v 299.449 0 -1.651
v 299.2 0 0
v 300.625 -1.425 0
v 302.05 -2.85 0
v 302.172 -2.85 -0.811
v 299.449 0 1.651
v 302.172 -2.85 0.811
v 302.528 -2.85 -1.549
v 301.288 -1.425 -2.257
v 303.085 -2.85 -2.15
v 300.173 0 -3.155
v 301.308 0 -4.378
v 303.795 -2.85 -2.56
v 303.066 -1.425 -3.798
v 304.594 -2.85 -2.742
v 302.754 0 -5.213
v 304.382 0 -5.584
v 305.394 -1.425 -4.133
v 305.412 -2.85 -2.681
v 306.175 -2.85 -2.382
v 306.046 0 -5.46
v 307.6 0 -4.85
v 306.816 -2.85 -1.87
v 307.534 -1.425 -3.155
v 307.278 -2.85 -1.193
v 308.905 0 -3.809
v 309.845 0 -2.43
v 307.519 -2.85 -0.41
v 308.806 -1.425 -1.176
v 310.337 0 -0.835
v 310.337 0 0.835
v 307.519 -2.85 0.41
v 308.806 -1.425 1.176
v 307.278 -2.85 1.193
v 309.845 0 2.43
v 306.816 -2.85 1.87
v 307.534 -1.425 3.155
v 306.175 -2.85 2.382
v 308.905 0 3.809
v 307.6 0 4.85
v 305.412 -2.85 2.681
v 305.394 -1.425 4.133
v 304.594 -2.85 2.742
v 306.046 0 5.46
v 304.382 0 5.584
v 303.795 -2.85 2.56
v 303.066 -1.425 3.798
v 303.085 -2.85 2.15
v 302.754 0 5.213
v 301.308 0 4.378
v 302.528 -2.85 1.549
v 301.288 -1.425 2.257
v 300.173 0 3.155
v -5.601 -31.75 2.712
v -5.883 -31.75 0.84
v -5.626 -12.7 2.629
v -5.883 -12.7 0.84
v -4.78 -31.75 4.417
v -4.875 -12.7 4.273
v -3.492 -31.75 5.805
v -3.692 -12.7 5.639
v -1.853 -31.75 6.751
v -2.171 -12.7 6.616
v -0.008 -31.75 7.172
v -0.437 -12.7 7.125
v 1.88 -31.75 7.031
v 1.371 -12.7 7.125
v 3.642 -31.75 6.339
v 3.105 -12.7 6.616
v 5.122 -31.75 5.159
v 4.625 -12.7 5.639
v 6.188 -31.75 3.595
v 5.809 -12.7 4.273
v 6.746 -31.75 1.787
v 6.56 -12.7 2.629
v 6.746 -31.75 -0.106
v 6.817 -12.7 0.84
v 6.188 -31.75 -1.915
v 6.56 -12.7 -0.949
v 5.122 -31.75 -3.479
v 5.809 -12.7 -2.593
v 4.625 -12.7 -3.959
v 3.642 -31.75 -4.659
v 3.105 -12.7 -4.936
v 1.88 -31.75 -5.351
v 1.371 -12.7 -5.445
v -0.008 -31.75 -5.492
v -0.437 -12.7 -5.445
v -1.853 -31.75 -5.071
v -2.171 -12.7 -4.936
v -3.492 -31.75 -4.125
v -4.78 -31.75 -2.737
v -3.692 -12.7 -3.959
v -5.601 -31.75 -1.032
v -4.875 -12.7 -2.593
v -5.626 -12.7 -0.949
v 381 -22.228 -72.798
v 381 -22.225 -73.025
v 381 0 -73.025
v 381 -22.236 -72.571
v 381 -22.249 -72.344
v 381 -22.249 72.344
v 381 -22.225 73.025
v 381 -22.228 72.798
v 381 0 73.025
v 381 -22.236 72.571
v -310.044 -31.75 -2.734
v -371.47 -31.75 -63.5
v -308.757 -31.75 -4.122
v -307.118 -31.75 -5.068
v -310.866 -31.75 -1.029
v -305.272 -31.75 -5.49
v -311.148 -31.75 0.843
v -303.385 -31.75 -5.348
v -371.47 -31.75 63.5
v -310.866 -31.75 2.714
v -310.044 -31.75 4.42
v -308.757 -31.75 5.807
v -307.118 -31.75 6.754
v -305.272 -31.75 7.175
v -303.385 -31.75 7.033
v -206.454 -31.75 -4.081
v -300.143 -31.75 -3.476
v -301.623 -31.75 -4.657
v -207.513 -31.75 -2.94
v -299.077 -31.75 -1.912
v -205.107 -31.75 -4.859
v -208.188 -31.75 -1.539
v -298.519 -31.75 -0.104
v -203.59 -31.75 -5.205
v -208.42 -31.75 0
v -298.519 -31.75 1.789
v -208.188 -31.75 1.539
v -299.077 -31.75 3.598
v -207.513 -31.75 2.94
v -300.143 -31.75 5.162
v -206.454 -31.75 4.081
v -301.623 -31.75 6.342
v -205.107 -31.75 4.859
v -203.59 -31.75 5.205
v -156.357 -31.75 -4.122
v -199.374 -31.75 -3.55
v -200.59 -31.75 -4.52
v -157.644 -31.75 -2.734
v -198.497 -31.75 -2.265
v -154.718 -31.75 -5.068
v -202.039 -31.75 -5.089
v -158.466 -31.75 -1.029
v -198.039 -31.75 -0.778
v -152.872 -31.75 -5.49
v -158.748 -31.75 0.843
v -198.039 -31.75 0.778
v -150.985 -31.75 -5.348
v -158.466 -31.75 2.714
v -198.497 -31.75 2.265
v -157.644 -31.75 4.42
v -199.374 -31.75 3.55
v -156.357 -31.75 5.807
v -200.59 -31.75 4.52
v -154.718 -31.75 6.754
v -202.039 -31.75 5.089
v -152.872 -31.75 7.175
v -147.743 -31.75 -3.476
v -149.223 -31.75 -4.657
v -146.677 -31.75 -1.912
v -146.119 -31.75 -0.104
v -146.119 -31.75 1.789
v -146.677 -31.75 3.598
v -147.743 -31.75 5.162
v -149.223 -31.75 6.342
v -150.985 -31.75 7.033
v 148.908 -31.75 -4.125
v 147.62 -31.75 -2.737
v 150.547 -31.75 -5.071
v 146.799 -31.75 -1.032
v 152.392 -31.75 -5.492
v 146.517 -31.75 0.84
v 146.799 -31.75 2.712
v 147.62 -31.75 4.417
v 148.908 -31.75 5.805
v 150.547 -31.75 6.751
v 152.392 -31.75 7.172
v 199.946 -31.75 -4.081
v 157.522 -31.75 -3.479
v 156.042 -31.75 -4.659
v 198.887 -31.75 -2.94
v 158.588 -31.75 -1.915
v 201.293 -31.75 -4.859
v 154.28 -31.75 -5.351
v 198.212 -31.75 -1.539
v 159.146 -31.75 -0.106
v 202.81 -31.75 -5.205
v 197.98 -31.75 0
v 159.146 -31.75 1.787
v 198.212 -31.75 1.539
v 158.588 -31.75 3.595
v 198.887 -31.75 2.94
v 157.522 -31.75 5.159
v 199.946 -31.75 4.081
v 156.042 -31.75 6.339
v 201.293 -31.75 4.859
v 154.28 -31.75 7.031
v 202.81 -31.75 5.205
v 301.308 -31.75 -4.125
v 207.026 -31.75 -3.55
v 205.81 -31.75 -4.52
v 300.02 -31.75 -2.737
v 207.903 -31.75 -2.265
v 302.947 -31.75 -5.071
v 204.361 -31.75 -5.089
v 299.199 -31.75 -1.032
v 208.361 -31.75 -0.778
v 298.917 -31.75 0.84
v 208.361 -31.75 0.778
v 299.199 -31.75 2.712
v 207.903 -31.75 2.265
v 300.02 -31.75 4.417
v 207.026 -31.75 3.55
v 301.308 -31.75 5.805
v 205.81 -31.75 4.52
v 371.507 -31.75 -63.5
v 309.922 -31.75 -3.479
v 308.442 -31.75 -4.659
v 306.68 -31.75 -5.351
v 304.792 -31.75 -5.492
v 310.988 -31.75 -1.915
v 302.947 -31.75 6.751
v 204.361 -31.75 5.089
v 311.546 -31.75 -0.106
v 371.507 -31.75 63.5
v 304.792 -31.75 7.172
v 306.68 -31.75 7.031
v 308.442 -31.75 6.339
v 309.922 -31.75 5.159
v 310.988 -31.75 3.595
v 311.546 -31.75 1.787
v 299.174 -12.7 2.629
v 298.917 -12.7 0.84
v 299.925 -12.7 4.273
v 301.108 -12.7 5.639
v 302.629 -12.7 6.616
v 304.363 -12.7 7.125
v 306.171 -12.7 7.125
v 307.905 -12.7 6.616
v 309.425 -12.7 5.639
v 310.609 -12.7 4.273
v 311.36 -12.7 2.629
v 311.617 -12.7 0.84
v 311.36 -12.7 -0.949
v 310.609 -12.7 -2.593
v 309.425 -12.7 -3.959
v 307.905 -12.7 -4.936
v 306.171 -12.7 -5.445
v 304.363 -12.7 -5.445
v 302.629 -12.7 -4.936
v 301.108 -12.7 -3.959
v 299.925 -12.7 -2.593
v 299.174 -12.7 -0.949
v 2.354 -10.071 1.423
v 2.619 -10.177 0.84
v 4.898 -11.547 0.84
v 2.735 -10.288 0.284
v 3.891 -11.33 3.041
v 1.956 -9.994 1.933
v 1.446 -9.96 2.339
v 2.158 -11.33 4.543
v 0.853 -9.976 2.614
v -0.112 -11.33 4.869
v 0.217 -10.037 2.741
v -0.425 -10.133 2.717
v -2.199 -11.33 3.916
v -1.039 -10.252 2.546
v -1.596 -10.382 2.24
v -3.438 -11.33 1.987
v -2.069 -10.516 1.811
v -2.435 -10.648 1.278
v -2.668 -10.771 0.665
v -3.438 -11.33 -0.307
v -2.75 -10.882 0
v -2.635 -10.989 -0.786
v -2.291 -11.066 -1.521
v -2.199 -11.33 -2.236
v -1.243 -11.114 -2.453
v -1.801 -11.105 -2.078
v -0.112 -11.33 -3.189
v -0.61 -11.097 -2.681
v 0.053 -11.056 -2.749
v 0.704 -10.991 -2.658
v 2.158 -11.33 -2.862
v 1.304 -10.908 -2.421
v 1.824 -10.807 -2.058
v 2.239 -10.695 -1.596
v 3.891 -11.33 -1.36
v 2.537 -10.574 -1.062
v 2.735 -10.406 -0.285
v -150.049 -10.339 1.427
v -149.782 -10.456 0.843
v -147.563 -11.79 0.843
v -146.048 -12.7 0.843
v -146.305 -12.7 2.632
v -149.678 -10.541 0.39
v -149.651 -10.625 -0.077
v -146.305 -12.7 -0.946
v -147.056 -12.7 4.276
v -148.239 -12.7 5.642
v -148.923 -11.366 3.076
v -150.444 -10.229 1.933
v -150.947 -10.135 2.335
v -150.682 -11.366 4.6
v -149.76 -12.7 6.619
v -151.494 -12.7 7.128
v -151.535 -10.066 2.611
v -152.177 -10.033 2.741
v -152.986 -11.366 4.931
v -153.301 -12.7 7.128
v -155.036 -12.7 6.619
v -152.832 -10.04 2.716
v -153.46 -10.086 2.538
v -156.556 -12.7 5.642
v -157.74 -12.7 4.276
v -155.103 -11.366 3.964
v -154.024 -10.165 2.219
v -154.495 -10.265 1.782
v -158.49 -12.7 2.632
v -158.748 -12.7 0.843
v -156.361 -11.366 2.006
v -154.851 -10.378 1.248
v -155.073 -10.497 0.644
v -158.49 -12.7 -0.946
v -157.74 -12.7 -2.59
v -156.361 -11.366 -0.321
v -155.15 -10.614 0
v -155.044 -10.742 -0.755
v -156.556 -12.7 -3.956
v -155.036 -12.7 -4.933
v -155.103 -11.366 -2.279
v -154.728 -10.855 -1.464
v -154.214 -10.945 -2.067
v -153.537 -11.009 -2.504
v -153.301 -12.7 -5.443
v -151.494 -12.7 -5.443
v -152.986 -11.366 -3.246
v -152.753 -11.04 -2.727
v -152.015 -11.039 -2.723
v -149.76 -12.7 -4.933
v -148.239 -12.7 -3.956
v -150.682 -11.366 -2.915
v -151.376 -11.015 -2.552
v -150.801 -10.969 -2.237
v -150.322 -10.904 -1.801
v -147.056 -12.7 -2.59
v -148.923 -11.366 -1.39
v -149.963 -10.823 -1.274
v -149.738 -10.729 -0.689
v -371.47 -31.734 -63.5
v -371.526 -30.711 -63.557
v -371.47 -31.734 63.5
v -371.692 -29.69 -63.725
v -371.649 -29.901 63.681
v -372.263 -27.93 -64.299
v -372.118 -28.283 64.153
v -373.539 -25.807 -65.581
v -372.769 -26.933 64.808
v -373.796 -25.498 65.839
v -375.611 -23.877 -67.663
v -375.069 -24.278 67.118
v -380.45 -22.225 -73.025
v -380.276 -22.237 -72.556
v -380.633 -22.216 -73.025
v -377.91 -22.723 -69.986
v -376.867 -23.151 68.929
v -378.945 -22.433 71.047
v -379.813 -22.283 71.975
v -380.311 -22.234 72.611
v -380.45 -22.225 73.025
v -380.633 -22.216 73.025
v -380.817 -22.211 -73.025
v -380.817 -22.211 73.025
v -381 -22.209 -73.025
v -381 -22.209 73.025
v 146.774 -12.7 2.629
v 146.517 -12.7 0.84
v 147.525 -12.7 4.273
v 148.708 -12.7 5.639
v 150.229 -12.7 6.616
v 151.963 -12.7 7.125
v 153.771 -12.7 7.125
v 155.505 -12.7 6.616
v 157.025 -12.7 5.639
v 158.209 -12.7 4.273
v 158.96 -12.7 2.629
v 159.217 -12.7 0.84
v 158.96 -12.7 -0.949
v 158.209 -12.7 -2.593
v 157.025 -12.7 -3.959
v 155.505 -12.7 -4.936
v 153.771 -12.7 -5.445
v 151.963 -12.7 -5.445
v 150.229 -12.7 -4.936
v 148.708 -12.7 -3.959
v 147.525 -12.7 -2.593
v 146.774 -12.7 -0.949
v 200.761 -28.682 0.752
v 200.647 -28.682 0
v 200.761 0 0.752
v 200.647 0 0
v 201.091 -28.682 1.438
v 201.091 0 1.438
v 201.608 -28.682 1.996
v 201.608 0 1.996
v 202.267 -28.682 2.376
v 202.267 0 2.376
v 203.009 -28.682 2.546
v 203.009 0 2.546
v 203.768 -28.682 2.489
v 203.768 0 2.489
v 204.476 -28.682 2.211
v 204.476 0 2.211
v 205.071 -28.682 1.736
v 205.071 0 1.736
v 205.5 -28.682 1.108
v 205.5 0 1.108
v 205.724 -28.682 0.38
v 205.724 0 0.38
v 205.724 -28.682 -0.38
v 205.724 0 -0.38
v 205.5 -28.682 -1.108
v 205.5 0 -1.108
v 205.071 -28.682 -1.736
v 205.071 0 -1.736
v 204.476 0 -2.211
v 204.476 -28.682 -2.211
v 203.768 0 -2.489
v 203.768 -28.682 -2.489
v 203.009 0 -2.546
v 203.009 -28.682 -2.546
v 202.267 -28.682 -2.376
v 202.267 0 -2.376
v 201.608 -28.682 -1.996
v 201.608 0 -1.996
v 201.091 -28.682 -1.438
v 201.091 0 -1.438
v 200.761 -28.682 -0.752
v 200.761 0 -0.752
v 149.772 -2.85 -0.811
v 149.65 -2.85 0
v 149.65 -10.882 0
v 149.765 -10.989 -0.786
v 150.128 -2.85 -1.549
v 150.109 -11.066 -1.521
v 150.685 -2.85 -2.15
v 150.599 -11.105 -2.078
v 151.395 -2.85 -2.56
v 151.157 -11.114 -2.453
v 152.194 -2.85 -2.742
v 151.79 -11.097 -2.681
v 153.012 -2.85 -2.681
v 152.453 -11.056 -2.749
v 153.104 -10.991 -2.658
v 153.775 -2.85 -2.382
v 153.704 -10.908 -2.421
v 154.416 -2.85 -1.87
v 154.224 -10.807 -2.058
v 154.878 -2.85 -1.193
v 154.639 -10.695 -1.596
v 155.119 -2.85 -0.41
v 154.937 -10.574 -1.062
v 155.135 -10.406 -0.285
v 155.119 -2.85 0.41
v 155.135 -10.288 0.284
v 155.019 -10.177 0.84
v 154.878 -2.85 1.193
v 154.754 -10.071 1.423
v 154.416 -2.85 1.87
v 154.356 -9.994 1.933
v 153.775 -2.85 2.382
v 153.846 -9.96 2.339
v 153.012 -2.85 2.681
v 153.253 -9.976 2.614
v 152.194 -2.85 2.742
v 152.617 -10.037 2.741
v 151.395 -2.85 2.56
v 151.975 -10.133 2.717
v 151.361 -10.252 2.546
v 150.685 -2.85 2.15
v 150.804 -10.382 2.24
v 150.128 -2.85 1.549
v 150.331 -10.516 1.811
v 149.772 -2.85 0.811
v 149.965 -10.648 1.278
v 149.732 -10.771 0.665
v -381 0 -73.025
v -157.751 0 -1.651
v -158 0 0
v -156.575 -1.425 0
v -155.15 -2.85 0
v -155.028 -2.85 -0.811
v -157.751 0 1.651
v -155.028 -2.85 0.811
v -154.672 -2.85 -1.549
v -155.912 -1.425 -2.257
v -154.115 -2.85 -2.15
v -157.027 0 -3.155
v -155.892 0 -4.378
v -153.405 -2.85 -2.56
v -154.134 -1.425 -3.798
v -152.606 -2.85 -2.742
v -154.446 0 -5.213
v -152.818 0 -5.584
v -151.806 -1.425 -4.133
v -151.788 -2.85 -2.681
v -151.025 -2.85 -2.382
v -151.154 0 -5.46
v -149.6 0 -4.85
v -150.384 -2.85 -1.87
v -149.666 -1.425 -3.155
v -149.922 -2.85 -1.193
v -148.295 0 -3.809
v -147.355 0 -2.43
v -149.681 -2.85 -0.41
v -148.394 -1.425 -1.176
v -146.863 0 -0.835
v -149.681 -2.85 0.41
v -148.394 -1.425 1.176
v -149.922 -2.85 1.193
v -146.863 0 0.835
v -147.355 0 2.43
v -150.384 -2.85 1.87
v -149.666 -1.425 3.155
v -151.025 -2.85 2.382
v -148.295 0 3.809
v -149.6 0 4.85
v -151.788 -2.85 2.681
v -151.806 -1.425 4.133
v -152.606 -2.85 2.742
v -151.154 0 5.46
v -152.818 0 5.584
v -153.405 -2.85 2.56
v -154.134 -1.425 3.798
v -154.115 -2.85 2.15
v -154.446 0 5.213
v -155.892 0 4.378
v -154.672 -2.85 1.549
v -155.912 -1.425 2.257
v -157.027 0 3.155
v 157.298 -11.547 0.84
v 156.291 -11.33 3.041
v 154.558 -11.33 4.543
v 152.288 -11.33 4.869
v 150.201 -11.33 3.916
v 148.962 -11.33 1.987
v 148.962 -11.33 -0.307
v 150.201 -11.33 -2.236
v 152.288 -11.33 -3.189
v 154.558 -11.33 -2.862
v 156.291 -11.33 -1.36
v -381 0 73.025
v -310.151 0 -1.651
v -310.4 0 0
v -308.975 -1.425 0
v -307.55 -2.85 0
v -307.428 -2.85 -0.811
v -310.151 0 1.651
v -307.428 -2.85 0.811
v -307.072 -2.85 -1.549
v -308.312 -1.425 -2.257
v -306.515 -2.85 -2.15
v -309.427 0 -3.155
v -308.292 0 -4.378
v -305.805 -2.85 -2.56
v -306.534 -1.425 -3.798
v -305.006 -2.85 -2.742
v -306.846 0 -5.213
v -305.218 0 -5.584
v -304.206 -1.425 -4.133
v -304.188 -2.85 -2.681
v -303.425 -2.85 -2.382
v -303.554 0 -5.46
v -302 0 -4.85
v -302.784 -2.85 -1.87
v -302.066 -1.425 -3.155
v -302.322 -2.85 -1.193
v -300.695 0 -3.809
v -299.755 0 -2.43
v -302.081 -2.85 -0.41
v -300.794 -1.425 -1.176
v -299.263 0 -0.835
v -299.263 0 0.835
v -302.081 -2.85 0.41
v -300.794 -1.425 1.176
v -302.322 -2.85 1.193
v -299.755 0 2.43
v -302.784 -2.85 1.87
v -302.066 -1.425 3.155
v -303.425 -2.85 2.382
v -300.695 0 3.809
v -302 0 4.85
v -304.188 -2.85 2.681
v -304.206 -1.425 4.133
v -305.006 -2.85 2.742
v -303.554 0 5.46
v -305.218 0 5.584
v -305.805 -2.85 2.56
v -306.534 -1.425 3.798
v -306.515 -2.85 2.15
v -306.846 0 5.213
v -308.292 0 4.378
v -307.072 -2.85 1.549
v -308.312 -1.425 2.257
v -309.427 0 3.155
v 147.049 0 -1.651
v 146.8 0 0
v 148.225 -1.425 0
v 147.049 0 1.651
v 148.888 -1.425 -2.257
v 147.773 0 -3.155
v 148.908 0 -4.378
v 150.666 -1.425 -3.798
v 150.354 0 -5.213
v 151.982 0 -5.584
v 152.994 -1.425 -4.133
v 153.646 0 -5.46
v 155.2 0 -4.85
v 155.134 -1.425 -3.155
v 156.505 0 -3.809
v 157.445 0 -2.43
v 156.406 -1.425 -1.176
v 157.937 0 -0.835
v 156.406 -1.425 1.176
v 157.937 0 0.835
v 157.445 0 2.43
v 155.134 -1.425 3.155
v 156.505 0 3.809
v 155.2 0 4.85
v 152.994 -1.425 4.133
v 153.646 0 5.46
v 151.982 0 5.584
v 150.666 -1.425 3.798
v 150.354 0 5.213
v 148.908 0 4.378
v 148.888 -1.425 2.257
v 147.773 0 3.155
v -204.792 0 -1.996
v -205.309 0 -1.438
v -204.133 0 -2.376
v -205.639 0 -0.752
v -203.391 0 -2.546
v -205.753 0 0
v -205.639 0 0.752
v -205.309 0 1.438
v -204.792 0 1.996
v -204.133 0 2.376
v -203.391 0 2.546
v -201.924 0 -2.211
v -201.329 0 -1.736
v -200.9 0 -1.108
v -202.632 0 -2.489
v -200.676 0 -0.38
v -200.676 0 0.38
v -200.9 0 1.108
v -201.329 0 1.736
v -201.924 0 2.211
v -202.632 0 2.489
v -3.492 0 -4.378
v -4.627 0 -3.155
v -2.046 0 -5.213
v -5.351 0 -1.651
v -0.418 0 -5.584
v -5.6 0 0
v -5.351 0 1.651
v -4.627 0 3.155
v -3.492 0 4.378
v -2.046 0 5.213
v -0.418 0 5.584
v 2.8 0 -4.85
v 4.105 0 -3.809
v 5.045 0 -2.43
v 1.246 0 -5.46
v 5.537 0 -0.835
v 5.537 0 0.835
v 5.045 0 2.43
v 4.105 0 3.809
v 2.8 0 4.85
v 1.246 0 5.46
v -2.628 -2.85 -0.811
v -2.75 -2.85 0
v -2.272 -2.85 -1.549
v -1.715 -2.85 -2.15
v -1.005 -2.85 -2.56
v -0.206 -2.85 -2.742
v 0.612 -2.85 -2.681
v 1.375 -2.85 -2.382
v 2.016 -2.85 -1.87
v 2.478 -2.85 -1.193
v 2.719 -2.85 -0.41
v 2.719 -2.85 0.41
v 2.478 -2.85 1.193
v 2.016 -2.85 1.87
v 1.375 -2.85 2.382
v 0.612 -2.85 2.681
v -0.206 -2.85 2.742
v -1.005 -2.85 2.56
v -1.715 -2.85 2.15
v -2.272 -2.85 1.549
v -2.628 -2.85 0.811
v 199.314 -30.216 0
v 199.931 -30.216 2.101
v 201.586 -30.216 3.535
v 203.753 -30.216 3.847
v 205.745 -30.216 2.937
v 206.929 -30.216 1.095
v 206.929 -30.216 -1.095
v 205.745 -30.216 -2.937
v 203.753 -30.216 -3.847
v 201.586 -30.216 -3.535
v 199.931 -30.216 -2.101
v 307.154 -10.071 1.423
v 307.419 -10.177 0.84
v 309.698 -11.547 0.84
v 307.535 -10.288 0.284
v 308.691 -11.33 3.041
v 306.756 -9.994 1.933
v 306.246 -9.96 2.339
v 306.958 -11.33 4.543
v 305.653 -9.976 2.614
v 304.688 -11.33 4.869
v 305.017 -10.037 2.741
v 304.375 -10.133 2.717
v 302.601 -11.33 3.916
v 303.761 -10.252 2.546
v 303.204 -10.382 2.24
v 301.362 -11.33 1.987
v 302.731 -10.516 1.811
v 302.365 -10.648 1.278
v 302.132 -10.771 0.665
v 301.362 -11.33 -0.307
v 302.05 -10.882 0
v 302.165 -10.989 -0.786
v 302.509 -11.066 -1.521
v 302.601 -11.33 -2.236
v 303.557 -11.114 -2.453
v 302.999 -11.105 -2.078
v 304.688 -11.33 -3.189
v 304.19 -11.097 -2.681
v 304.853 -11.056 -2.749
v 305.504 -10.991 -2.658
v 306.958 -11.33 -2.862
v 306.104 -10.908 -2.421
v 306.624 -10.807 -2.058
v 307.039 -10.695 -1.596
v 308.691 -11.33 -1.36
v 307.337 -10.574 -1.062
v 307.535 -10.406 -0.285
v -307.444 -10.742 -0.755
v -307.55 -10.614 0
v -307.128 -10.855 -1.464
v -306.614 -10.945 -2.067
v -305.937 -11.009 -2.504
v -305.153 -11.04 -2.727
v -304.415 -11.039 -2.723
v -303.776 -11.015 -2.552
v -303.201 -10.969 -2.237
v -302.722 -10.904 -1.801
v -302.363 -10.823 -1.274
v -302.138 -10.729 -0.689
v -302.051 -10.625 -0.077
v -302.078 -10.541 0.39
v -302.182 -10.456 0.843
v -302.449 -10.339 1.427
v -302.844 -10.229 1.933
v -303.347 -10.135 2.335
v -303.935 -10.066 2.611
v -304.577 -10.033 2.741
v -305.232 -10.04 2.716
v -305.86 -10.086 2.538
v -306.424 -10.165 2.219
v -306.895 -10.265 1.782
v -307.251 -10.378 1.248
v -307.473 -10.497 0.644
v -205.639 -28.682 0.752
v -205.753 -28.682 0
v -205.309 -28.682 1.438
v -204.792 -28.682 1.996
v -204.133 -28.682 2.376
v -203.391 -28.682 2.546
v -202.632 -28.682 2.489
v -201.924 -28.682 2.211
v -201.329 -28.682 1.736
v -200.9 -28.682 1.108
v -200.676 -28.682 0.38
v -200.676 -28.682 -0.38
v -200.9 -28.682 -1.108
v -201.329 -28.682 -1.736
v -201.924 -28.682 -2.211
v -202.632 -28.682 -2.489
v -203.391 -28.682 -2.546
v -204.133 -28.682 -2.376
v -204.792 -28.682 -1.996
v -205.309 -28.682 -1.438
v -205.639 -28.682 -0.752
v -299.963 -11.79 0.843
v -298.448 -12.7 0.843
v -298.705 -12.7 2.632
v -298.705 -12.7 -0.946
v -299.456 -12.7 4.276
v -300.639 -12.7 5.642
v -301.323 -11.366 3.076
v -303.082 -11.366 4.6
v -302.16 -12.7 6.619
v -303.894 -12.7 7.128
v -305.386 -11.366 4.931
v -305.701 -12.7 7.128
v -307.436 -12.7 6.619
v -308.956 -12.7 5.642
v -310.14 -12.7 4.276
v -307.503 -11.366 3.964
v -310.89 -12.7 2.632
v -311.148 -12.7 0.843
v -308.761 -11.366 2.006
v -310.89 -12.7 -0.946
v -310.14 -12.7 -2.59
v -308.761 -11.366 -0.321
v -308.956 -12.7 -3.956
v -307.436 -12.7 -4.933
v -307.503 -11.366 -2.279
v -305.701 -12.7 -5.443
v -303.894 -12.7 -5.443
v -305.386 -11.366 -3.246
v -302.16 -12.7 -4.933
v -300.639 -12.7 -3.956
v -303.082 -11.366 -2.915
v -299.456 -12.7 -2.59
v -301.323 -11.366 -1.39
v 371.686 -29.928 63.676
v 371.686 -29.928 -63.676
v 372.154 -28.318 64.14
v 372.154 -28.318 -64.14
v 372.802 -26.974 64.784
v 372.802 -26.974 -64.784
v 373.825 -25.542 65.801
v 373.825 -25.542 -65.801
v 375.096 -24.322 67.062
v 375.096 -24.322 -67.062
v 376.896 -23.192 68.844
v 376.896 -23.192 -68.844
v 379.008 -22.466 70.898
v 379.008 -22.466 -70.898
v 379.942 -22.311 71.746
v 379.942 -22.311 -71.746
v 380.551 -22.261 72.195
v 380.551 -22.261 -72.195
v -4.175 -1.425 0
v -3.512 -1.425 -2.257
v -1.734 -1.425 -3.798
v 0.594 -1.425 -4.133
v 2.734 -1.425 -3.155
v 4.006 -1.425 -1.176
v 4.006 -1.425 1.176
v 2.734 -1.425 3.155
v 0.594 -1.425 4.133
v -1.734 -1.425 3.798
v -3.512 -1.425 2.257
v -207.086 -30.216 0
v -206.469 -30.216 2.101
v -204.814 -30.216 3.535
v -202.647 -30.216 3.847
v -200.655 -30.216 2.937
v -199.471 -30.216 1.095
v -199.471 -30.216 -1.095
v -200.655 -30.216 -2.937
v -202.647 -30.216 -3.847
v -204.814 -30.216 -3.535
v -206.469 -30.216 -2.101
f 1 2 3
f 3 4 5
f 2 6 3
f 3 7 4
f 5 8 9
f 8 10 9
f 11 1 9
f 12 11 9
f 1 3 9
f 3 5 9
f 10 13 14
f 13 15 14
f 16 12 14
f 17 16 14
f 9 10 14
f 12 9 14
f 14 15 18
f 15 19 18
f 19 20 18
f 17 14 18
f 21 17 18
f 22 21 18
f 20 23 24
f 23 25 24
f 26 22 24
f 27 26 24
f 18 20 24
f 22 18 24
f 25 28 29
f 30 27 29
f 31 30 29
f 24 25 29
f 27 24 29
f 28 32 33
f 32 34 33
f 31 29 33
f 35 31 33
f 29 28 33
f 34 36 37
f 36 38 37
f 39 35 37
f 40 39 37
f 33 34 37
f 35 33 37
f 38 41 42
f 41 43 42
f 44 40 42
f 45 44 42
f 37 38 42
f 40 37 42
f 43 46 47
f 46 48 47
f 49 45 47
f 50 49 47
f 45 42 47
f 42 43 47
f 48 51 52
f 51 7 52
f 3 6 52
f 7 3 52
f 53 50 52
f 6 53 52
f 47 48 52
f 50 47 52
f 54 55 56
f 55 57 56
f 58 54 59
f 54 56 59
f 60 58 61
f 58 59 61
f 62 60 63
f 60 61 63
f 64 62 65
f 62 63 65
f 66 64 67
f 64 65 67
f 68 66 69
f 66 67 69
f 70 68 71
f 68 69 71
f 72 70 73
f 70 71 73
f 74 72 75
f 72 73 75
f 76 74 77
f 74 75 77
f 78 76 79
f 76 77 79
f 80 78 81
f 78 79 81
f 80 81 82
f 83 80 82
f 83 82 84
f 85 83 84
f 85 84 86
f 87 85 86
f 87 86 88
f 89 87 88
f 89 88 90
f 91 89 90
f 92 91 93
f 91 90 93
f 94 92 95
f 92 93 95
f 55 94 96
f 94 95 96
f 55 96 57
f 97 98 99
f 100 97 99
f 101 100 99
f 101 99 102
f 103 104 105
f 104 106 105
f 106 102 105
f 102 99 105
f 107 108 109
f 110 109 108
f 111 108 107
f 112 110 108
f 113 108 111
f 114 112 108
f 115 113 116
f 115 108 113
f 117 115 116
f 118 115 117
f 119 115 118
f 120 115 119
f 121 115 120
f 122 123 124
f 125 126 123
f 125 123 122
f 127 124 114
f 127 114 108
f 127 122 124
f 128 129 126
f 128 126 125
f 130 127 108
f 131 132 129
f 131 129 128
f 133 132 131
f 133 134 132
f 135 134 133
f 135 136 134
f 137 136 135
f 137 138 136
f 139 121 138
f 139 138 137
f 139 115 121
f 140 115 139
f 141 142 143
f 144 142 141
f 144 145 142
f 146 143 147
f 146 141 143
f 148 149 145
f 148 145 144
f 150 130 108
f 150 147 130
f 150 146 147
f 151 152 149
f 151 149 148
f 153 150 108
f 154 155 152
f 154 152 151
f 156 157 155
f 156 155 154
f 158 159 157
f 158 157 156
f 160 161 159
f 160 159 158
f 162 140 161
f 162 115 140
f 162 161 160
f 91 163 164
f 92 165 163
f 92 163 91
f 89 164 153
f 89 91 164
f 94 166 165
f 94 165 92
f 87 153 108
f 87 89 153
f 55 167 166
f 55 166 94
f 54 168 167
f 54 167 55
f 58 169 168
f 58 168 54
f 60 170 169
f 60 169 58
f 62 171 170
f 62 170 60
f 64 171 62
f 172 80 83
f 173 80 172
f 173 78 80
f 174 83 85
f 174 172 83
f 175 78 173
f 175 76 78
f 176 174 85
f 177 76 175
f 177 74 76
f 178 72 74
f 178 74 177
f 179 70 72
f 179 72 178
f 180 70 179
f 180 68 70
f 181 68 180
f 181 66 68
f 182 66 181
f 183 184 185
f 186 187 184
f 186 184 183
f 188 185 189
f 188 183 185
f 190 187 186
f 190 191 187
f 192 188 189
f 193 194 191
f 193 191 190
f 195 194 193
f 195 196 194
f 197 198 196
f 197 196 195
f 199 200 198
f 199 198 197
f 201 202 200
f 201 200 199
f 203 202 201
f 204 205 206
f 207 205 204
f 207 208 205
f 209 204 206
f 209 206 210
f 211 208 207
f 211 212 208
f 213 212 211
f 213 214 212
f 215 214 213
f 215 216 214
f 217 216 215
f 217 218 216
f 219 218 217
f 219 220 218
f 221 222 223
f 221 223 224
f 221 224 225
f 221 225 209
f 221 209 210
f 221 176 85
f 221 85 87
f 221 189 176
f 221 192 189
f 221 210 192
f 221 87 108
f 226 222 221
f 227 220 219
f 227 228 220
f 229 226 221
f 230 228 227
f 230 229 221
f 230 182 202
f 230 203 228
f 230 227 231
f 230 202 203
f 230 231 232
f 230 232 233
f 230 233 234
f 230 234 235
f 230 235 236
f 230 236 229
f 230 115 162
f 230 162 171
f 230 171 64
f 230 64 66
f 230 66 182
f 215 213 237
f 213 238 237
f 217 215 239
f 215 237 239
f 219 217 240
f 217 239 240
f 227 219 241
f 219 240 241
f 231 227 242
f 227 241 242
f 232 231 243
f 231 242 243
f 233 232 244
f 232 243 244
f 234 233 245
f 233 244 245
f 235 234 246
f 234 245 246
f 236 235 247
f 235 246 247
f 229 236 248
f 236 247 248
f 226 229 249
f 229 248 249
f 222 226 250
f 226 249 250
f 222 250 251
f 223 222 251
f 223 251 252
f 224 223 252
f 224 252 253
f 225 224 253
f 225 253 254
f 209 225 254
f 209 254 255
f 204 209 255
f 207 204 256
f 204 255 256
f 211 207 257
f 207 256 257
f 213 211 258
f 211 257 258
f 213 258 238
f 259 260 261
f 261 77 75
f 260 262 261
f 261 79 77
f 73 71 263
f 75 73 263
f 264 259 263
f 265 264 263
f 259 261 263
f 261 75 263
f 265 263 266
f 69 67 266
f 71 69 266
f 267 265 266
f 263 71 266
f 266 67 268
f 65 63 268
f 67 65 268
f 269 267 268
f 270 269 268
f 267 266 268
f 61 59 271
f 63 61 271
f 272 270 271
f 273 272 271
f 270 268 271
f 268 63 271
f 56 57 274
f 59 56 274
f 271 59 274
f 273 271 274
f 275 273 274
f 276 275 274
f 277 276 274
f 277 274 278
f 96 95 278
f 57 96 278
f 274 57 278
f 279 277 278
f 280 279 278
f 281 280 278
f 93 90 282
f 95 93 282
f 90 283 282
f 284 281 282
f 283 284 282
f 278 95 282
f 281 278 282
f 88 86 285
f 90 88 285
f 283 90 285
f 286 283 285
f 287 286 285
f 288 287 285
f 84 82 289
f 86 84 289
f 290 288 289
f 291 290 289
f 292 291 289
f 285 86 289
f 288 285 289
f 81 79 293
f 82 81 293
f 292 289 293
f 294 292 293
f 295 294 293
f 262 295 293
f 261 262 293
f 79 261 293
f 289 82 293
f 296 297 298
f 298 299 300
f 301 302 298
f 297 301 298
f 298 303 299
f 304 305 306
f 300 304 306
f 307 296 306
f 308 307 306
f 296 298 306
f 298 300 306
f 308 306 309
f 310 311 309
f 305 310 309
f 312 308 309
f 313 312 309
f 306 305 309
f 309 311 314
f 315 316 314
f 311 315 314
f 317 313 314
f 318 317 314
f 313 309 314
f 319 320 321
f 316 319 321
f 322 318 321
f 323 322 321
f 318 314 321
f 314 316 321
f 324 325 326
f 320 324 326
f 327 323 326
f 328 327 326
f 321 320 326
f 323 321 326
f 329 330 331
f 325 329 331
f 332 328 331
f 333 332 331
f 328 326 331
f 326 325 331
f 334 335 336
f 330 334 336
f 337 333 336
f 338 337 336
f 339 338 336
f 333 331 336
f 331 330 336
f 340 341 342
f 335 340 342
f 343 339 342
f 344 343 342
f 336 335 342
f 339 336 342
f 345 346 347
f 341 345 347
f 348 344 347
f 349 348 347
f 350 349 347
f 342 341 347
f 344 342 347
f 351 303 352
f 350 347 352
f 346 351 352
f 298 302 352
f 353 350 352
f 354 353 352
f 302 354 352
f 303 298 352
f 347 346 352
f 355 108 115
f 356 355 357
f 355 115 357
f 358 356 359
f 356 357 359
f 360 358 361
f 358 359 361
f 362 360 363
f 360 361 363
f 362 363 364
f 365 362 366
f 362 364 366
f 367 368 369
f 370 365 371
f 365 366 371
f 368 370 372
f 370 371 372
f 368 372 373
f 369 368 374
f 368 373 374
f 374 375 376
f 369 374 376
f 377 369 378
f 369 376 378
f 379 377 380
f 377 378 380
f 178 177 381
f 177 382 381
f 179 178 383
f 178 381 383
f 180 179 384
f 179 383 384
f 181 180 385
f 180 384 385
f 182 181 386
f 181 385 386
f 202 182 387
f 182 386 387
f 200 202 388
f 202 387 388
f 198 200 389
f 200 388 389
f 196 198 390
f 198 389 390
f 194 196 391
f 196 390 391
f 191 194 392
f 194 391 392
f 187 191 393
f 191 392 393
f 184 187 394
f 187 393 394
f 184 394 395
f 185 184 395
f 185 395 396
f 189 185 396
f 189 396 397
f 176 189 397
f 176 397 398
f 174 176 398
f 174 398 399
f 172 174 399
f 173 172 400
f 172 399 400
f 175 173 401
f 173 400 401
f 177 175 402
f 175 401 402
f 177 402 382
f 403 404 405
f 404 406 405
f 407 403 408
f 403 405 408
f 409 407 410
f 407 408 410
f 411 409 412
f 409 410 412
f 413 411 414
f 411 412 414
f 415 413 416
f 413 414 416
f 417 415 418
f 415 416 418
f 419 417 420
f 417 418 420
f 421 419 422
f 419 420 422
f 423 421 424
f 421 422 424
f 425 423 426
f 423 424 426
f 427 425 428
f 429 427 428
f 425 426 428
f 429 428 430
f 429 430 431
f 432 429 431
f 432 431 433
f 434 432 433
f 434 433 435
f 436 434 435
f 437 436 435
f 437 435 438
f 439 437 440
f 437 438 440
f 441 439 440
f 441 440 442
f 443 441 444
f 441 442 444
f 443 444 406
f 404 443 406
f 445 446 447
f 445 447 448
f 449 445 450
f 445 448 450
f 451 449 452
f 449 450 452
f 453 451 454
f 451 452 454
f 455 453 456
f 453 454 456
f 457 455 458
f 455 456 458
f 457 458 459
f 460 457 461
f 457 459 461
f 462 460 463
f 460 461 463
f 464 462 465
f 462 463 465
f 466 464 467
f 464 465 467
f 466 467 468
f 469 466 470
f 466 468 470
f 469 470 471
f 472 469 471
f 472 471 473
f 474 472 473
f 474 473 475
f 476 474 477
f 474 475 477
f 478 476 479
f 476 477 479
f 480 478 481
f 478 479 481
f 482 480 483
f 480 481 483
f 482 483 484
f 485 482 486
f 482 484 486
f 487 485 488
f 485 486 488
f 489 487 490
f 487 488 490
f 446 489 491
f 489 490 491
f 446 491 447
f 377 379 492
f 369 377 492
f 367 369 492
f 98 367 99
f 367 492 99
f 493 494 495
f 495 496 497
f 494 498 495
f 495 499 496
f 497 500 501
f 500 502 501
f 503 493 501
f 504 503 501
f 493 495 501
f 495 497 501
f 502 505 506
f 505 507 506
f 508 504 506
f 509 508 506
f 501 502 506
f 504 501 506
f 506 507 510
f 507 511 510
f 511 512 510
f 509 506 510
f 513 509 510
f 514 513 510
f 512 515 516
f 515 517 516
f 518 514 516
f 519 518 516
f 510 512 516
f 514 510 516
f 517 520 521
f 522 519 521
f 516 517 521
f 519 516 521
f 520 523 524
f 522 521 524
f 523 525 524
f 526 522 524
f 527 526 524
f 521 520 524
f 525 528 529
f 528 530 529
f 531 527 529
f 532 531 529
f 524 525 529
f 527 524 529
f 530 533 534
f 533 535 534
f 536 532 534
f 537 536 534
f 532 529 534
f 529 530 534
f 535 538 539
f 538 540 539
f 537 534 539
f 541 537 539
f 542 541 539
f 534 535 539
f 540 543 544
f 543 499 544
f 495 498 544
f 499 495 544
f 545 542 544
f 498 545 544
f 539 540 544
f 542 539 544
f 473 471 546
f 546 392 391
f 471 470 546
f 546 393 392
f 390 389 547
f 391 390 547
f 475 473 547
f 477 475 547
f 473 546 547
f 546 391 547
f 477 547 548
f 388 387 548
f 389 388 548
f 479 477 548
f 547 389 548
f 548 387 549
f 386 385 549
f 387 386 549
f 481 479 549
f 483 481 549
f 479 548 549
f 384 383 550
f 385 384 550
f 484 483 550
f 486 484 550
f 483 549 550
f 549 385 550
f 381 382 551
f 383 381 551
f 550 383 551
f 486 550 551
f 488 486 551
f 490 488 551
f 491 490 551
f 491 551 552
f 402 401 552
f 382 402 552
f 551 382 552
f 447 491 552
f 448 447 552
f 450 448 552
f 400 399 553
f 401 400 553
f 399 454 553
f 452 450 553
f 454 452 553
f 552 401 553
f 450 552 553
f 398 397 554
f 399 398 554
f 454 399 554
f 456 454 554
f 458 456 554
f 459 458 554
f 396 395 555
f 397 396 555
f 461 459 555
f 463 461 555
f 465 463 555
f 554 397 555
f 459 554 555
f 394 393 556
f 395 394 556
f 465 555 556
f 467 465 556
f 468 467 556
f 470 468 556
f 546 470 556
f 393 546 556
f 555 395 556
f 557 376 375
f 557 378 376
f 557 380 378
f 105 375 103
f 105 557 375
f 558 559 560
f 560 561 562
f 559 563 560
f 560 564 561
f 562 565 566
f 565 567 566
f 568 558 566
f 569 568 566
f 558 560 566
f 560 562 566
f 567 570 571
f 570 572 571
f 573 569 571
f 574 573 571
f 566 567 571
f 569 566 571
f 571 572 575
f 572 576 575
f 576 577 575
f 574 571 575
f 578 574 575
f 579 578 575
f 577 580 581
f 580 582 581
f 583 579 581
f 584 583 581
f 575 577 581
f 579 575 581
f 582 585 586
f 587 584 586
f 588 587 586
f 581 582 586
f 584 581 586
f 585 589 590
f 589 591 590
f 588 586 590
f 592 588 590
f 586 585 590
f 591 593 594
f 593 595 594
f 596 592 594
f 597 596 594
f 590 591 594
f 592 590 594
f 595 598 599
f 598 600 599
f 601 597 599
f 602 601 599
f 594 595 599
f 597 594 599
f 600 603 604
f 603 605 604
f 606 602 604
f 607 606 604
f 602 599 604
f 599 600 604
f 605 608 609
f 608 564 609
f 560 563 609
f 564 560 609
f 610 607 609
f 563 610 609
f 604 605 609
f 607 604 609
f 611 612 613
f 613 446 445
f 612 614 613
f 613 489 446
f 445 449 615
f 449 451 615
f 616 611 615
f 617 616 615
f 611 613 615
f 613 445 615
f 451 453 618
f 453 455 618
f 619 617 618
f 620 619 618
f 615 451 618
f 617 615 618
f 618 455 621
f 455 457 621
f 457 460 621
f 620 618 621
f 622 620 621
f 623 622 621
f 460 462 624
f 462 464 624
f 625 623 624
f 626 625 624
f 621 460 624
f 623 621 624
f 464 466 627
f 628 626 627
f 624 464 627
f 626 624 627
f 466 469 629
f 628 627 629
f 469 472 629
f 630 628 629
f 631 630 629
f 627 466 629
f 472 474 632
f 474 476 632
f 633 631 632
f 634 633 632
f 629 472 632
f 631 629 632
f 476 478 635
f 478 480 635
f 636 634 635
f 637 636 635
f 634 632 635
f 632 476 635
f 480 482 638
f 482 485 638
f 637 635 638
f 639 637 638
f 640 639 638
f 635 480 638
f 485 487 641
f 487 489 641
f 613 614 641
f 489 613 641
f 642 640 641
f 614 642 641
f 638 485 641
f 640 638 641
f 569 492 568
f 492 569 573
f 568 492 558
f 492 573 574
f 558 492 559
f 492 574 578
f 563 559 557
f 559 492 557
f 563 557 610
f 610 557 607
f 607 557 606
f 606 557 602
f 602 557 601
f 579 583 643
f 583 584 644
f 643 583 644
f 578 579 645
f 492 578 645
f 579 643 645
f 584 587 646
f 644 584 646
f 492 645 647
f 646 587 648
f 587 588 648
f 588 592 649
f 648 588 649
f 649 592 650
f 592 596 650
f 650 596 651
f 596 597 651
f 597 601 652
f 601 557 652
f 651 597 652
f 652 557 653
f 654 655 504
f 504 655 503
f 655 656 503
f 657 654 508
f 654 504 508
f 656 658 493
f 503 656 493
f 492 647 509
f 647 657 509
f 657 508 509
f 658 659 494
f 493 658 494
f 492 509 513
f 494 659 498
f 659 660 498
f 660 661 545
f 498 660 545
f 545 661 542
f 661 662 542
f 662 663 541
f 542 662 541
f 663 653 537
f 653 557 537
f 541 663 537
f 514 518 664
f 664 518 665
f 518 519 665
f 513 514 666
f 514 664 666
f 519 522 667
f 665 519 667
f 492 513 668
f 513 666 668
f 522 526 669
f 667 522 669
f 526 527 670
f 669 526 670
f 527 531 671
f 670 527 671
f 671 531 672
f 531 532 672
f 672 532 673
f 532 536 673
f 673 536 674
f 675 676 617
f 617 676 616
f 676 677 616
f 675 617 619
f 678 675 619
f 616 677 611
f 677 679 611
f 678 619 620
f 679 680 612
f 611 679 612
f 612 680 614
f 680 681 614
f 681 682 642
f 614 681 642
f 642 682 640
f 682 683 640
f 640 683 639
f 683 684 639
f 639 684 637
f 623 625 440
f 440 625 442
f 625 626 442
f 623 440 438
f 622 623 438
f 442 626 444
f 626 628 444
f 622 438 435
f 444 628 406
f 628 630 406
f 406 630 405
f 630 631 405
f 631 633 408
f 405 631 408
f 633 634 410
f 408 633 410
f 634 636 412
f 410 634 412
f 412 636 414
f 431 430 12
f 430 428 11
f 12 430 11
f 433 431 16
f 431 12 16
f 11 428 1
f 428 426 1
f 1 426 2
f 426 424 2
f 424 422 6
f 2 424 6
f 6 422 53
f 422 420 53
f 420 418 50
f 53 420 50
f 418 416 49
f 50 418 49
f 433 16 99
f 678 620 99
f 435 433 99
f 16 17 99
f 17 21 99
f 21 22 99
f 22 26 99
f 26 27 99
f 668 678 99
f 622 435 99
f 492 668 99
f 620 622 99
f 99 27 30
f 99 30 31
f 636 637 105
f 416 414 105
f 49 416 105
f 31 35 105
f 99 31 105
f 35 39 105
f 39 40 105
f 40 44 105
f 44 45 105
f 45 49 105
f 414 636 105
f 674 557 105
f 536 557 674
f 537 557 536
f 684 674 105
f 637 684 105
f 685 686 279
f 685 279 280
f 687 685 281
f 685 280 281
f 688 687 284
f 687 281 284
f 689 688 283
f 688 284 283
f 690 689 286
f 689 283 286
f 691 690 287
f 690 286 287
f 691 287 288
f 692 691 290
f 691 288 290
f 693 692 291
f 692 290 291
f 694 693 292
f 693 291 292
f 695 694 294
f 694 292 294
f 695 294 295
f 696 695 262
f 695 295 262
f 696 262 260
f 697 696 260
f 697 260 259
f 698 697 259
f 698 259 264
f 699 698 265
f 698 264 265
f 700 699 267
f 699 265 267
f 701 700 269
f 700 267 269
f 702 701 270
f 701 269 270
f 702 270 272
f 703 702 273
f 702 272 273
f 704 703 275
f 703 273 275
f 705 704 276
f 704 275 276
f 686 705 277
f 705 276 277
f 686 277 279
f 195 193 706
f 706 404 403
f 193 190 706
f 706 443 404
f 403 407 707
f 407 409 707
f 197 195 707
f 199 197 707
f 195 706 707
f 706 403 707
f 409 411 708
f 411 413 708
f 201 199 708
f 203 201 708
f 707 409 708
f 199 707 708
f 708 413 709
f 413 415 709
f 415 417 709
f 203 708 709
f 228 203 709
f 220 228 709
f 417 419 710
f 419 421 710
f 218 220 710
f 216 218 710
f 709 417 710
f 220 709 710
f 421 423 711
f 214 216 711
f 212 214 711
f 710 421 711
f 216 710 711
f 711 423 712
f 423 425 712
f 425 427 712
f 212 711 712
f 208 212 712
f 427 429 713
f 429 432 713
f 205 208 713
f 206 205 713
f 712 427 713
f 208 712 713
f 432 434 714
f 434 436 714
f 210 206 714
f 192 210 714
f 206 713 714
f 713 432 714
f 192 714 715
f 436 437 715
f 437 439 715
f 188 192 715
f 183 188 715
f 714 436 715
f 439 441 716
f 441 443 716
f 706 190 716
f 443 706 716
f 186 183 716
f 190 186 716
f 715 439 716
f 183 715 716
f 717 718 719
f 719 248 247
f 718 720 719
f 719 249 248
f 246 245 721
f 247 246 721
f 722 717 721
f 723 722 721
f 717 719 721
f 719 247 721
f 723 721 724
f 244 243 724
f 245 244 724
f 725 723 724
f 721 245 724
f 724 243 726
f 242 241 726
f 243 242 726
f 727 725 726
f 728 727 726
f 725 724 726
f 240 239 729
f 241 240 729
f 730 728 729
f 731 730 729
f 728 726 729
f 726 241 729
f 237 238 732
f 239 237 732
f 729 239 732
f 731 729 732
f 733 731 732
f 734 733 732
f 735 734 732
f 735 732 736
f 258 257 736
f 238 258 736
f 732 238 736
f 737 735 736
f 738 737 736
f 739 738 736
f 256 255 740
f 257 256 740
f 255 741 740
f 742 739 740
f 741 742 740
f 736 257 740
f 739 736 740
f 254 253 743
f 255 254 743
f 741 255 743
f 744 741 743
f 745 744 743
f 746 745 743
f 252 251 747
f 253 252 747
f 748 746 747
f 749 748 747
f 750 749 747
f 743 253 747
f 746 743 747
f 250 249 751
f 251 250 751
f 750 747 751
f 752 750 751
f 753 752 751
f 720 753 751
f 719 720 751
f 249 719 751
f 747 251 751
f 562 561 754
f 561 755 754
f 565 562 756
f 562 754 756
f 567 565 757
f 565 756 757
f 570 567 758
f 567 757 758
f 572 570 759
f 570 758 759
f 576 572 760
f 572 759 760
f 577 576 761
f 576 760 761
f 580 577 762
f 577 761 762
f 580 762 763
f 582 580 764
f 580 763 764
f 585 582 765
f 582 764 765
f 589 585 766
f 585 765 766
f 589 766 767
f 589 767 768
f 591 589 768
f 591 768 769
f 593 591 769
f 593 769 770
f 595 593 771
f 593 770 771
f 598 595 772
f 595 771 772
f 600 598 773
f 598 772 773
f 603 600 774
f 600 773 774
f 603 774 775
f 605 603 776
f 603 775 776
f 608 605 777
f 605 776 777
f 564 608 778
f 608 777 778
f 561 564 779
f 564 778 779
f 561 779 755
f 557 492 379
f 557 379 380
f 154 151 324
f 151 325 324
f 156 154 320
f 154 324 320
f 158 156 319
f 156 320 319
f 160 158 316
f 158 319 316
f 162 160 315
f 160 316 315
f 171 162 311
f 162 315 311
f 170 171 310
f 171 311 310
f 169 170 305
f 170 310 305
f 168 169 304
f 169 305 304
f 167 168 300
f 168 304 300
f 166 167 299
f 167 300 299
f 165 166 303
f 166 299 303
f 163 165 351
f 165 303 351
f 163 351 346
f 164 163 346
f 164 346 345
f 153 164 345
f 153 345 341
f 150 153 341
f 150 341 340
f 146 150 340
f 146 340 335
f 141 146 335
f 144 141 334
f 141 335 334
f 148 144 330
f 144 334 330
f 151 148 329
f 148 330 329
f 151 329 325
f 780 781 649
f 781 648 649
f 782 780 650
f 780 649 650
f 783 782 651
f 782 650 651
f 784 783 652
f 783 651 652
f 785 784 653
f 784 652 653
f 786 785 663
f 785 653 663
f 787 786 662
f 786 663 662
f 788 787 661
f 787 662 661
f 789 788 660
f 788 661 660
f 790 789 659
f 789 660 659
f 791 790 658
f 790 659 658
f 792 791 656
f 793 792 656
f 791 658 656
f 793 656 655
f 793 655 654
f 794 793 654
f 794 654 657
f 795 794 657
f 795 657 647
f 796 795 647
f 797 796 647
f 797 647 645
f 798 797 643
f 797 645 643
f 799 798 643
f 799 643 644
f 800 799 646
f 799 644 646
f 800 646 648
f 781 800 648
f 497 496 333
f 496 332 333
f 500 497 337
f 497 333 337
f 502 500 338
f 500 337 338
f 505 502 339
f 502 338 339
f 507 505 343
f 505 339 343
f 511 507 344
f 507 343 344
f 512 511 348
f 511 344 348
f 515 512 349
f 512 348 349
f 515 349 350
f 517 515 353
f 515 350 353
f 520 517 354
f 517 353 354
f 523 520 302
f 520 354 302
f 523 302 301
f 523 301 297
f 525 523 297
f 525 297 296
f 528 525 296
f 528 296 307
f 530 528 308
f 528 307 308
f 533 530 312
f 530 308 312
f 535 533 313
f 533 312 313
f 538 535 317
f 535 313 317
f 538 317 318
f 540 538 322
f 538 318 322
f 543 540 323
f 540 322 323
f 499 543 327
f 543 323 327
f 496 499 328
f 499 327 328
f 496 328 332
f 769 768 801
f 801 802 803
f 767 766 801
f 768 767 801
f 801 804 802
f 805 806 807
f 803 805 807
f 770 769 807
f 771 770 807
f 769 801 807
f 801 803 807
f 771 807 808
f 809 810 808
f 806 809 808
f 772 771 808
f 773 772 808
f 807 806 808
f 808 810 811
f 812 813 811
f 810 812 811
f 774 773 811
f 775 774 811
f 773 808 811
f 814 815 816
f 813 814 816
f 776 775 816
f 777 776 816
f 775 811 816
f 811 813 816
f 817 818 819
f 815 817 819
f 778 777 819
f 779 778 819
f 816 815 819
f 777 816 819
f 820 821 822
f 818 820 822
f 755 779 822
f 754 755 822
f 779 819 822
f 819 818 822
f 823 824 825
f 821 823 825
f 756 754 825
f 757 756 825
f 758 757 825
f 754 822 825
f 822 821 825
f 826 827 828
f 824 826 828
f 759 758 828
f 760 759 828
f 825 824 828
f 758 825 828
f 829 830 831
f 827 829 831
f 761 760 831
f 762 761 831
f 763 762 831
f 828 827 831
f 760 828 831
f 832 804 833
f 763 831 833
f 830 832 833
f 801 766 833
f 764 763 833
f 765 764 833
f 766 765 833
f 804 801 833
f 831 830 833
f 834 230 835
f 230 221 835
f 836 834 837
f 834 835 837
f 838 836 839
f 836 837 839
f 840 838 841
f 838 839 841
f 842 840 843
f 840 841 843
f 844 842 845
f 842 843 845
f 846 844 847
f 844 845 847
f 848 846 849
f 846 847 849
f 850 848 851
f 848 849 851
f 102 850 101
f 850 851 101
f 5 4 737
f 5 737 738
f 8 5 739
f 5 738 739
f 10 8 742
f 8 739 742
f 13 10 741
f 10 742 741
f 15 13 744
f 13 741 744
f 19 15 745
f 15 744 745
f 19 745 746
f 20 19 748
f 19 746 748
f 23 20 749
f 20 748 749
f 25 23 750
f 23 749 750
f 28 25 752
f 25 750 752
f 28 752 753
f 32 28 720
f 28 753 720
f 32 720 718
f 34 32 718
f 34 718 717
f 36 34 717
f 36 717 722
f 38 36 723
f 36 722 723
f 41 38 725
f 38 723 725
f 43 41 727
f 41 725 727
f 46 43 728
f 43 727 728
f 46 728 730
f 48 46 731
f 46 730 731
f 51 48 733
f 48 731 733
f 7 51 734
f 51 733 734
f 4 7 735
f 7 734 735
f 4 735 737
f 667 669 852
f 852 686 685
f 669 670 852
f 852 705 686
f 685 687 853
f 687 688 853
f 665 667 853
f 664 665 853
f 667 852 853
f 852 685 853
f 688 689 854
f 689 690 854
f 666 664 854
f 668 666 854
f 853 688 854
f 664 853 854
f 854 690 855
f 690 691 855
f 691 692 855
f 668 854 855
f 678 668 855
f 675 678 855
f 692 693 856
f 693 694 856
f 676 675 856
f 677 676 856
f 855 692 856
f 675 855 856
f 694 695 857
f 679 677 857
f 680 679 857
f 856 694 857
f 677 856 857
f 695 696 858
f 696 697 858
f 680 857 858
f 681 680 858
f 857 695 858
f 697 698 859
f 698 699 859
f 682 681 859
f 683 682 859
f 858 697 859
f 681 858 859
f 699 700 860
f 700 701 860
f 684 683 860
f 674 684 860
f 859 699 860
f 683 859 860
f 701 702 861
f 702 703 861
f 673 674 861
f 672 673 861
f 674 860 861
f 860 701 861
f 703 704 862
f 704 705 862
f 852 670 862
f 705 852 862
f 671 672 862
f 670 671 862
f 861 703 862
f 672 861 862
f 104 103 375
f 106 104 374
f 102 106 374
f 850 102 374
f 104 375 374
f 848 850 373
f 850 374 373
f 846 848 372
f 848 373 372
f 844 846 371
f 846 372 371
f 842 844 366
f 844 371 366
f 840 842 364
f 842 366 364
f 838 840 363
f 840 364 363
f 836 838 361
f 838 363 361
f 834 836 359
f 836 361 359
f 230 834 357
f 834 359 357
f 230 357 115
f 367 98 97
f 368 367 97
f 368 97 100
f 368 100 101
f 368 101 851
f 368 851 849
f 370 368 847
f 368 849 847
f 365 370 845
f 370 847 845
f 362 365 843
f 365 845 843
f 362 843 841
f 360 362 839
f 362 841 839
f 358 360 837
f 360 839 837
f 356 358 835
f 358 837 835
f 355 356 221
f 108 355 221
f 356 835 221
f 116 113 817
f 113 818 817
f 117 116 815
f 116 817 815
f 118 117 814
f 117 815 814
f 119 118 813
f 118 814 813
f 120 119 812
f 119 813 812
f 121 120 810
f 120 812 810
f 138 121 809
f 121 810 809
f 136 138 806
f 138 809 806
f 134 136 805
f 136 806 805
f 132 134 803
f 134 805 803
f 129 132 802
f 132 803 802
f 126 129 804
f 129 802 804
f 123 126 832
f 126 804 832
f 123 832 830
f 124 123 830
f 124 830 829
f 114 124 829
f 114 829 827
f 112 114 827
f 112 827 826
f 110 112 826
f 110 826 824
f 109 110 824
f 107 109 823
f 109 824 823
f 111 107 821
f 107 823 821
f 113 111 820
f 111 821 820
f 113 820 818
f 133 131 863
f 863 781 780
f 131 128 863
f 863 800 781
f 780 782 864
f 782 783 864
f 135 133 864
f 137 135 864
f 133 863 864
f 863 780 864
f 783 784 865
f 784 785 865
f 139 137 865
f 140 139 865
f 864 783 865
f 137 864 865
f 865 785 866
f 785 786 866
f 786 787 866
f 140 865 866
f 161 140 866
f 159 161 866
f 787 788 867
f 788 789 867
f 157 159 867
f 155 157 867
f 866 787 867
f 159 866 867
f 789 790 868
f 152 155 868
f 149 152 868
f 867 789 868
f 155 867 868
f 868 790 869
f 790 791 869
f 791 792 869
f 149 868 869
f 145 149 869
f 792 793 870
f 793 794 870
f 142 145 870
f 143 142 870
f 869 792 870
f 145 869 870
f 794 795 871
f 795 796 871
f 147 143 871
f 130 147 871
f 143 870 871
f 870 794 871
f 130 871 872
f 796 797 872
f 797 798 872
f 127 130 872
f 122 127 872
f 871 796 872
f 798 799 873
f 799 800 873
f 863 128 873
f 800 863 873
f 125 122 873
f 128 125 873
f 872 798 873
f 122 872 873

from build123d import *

# Parameters (mm, degrees)
F0_W            = 762
F0_H            = 146.05
F1_DEPTH        = 31.75
F2_R            = 9.525
F3_DEPTH        = 762.001
F4_R            = 9.525
F5_DEPTH        = 146.051
F6_R            = 9.525
F7_DEPTH        = 762.0010001
F8_R            = 9.5195259248
F9_DEPTH        = 146.0510001
F11_D           = 12.7
F11_DEPTH       = 19.05
F11_TIP         = 3.8154649308
F12_D           = 5.5
F12_CSINK_D     = 11.2
F12_CSINK_ANGLE = 90
F14_D           = 5.1054
F14_CSINK_D     = 10.4394
F14_CSINK_ANGLE = 82


with BuildPart() as f1:
    # F0 (on Front) → F1 (new body)
    with BuildSketch(Plane.XZ):
        Rectangle(F0_W, F0_H)
    extrude(amount=F1_DEPTH)

    # F2 (on face) → F3 (cut, through all)
    with BuildSketch(Plane(origin=(-381, 0, 0), x_dir=(0, -1, 0), z_dir=(-1, 0, 0))):
        with Locations((31.75, 73.025)):
            Circle(F2_R)
    extrude(amount=-F3_DEPTH, mode=Mode.SUBTRACT)

    # F4 (on face) → F5 (cut, through all)
    with BuildSketch(Plane.XY.offset(73.025)):
        with Locations((-380.995452404, -31.7343771458)):
            Circle(F4_R)
    extrude(amount=-F5_DEPTH, mode=Mode.SUBTRACT)

    # F6 (on face) → F7 (cut, through all)
    with BuildSketch(Plane.YZ.offset(381)):
        with Locations((-31.75, -73.025)):
            Circle(F6_R)
    extrude(amount=-F7_DEPTH, mode=Mode.SUBTRACT)

    # F8 (on face) → F9 (cut, through all)
    with BuildSketch(Plane(origin=(0, 0, -73.025), x_dir=(1, 0, 0), z_dir=(0, 0, -1))):
        with Locations((381.0260295868, 31.7688845098)):
            Circle(F8_R)
    extrude(amount=-F9_DEPTH, mode=Mode.SUBTRACT)

    # F11
    with Locations(Plane.XZ.offset(31.75)):
        with Locations((-304.7976701619, 0.8426916512), (-152.3976701619, 0.8426916512), (0.466863421, 0.8401229861), (152.866863421, 0.8401229861), (305.266863421, 0.8401229861)):
            Hole(F11_D / 2, depth=F11_DEPTH)
            with Locations((0, 0, -(F11_DEPTH + F11_TIP / 2))):  # 118° drill point
                Cone(0, F11_D / 2, F11_TIP, mode=Mode.SUBTRACT)

    # F12 (through all)
    with Locations(Plane(origin=(0, 0, 0), x_dir=(1, 0, 0), z_dir=(0, 1, 0))):
        with Locations((304.8, 0), (152.4, 0), (0, 0), (-152.4, 0), (-304.8, 0)):
            CounterSinkHole(F12_D / 2, F12_CSINK_D / 2, counter_sink_angle=F12_CSINK_ANGLE)

    # F14 (through all)
    with Locations(Plane.XZ.offset(31.75)):
        with Locations((-203.2, 0), (203.2, 0)):
            CounterSinkHole(F14_D / 2, F14_CSINK_D / 2, counter_sink_angle=F14_CSINK_ANGLE)


solid = f1.part
